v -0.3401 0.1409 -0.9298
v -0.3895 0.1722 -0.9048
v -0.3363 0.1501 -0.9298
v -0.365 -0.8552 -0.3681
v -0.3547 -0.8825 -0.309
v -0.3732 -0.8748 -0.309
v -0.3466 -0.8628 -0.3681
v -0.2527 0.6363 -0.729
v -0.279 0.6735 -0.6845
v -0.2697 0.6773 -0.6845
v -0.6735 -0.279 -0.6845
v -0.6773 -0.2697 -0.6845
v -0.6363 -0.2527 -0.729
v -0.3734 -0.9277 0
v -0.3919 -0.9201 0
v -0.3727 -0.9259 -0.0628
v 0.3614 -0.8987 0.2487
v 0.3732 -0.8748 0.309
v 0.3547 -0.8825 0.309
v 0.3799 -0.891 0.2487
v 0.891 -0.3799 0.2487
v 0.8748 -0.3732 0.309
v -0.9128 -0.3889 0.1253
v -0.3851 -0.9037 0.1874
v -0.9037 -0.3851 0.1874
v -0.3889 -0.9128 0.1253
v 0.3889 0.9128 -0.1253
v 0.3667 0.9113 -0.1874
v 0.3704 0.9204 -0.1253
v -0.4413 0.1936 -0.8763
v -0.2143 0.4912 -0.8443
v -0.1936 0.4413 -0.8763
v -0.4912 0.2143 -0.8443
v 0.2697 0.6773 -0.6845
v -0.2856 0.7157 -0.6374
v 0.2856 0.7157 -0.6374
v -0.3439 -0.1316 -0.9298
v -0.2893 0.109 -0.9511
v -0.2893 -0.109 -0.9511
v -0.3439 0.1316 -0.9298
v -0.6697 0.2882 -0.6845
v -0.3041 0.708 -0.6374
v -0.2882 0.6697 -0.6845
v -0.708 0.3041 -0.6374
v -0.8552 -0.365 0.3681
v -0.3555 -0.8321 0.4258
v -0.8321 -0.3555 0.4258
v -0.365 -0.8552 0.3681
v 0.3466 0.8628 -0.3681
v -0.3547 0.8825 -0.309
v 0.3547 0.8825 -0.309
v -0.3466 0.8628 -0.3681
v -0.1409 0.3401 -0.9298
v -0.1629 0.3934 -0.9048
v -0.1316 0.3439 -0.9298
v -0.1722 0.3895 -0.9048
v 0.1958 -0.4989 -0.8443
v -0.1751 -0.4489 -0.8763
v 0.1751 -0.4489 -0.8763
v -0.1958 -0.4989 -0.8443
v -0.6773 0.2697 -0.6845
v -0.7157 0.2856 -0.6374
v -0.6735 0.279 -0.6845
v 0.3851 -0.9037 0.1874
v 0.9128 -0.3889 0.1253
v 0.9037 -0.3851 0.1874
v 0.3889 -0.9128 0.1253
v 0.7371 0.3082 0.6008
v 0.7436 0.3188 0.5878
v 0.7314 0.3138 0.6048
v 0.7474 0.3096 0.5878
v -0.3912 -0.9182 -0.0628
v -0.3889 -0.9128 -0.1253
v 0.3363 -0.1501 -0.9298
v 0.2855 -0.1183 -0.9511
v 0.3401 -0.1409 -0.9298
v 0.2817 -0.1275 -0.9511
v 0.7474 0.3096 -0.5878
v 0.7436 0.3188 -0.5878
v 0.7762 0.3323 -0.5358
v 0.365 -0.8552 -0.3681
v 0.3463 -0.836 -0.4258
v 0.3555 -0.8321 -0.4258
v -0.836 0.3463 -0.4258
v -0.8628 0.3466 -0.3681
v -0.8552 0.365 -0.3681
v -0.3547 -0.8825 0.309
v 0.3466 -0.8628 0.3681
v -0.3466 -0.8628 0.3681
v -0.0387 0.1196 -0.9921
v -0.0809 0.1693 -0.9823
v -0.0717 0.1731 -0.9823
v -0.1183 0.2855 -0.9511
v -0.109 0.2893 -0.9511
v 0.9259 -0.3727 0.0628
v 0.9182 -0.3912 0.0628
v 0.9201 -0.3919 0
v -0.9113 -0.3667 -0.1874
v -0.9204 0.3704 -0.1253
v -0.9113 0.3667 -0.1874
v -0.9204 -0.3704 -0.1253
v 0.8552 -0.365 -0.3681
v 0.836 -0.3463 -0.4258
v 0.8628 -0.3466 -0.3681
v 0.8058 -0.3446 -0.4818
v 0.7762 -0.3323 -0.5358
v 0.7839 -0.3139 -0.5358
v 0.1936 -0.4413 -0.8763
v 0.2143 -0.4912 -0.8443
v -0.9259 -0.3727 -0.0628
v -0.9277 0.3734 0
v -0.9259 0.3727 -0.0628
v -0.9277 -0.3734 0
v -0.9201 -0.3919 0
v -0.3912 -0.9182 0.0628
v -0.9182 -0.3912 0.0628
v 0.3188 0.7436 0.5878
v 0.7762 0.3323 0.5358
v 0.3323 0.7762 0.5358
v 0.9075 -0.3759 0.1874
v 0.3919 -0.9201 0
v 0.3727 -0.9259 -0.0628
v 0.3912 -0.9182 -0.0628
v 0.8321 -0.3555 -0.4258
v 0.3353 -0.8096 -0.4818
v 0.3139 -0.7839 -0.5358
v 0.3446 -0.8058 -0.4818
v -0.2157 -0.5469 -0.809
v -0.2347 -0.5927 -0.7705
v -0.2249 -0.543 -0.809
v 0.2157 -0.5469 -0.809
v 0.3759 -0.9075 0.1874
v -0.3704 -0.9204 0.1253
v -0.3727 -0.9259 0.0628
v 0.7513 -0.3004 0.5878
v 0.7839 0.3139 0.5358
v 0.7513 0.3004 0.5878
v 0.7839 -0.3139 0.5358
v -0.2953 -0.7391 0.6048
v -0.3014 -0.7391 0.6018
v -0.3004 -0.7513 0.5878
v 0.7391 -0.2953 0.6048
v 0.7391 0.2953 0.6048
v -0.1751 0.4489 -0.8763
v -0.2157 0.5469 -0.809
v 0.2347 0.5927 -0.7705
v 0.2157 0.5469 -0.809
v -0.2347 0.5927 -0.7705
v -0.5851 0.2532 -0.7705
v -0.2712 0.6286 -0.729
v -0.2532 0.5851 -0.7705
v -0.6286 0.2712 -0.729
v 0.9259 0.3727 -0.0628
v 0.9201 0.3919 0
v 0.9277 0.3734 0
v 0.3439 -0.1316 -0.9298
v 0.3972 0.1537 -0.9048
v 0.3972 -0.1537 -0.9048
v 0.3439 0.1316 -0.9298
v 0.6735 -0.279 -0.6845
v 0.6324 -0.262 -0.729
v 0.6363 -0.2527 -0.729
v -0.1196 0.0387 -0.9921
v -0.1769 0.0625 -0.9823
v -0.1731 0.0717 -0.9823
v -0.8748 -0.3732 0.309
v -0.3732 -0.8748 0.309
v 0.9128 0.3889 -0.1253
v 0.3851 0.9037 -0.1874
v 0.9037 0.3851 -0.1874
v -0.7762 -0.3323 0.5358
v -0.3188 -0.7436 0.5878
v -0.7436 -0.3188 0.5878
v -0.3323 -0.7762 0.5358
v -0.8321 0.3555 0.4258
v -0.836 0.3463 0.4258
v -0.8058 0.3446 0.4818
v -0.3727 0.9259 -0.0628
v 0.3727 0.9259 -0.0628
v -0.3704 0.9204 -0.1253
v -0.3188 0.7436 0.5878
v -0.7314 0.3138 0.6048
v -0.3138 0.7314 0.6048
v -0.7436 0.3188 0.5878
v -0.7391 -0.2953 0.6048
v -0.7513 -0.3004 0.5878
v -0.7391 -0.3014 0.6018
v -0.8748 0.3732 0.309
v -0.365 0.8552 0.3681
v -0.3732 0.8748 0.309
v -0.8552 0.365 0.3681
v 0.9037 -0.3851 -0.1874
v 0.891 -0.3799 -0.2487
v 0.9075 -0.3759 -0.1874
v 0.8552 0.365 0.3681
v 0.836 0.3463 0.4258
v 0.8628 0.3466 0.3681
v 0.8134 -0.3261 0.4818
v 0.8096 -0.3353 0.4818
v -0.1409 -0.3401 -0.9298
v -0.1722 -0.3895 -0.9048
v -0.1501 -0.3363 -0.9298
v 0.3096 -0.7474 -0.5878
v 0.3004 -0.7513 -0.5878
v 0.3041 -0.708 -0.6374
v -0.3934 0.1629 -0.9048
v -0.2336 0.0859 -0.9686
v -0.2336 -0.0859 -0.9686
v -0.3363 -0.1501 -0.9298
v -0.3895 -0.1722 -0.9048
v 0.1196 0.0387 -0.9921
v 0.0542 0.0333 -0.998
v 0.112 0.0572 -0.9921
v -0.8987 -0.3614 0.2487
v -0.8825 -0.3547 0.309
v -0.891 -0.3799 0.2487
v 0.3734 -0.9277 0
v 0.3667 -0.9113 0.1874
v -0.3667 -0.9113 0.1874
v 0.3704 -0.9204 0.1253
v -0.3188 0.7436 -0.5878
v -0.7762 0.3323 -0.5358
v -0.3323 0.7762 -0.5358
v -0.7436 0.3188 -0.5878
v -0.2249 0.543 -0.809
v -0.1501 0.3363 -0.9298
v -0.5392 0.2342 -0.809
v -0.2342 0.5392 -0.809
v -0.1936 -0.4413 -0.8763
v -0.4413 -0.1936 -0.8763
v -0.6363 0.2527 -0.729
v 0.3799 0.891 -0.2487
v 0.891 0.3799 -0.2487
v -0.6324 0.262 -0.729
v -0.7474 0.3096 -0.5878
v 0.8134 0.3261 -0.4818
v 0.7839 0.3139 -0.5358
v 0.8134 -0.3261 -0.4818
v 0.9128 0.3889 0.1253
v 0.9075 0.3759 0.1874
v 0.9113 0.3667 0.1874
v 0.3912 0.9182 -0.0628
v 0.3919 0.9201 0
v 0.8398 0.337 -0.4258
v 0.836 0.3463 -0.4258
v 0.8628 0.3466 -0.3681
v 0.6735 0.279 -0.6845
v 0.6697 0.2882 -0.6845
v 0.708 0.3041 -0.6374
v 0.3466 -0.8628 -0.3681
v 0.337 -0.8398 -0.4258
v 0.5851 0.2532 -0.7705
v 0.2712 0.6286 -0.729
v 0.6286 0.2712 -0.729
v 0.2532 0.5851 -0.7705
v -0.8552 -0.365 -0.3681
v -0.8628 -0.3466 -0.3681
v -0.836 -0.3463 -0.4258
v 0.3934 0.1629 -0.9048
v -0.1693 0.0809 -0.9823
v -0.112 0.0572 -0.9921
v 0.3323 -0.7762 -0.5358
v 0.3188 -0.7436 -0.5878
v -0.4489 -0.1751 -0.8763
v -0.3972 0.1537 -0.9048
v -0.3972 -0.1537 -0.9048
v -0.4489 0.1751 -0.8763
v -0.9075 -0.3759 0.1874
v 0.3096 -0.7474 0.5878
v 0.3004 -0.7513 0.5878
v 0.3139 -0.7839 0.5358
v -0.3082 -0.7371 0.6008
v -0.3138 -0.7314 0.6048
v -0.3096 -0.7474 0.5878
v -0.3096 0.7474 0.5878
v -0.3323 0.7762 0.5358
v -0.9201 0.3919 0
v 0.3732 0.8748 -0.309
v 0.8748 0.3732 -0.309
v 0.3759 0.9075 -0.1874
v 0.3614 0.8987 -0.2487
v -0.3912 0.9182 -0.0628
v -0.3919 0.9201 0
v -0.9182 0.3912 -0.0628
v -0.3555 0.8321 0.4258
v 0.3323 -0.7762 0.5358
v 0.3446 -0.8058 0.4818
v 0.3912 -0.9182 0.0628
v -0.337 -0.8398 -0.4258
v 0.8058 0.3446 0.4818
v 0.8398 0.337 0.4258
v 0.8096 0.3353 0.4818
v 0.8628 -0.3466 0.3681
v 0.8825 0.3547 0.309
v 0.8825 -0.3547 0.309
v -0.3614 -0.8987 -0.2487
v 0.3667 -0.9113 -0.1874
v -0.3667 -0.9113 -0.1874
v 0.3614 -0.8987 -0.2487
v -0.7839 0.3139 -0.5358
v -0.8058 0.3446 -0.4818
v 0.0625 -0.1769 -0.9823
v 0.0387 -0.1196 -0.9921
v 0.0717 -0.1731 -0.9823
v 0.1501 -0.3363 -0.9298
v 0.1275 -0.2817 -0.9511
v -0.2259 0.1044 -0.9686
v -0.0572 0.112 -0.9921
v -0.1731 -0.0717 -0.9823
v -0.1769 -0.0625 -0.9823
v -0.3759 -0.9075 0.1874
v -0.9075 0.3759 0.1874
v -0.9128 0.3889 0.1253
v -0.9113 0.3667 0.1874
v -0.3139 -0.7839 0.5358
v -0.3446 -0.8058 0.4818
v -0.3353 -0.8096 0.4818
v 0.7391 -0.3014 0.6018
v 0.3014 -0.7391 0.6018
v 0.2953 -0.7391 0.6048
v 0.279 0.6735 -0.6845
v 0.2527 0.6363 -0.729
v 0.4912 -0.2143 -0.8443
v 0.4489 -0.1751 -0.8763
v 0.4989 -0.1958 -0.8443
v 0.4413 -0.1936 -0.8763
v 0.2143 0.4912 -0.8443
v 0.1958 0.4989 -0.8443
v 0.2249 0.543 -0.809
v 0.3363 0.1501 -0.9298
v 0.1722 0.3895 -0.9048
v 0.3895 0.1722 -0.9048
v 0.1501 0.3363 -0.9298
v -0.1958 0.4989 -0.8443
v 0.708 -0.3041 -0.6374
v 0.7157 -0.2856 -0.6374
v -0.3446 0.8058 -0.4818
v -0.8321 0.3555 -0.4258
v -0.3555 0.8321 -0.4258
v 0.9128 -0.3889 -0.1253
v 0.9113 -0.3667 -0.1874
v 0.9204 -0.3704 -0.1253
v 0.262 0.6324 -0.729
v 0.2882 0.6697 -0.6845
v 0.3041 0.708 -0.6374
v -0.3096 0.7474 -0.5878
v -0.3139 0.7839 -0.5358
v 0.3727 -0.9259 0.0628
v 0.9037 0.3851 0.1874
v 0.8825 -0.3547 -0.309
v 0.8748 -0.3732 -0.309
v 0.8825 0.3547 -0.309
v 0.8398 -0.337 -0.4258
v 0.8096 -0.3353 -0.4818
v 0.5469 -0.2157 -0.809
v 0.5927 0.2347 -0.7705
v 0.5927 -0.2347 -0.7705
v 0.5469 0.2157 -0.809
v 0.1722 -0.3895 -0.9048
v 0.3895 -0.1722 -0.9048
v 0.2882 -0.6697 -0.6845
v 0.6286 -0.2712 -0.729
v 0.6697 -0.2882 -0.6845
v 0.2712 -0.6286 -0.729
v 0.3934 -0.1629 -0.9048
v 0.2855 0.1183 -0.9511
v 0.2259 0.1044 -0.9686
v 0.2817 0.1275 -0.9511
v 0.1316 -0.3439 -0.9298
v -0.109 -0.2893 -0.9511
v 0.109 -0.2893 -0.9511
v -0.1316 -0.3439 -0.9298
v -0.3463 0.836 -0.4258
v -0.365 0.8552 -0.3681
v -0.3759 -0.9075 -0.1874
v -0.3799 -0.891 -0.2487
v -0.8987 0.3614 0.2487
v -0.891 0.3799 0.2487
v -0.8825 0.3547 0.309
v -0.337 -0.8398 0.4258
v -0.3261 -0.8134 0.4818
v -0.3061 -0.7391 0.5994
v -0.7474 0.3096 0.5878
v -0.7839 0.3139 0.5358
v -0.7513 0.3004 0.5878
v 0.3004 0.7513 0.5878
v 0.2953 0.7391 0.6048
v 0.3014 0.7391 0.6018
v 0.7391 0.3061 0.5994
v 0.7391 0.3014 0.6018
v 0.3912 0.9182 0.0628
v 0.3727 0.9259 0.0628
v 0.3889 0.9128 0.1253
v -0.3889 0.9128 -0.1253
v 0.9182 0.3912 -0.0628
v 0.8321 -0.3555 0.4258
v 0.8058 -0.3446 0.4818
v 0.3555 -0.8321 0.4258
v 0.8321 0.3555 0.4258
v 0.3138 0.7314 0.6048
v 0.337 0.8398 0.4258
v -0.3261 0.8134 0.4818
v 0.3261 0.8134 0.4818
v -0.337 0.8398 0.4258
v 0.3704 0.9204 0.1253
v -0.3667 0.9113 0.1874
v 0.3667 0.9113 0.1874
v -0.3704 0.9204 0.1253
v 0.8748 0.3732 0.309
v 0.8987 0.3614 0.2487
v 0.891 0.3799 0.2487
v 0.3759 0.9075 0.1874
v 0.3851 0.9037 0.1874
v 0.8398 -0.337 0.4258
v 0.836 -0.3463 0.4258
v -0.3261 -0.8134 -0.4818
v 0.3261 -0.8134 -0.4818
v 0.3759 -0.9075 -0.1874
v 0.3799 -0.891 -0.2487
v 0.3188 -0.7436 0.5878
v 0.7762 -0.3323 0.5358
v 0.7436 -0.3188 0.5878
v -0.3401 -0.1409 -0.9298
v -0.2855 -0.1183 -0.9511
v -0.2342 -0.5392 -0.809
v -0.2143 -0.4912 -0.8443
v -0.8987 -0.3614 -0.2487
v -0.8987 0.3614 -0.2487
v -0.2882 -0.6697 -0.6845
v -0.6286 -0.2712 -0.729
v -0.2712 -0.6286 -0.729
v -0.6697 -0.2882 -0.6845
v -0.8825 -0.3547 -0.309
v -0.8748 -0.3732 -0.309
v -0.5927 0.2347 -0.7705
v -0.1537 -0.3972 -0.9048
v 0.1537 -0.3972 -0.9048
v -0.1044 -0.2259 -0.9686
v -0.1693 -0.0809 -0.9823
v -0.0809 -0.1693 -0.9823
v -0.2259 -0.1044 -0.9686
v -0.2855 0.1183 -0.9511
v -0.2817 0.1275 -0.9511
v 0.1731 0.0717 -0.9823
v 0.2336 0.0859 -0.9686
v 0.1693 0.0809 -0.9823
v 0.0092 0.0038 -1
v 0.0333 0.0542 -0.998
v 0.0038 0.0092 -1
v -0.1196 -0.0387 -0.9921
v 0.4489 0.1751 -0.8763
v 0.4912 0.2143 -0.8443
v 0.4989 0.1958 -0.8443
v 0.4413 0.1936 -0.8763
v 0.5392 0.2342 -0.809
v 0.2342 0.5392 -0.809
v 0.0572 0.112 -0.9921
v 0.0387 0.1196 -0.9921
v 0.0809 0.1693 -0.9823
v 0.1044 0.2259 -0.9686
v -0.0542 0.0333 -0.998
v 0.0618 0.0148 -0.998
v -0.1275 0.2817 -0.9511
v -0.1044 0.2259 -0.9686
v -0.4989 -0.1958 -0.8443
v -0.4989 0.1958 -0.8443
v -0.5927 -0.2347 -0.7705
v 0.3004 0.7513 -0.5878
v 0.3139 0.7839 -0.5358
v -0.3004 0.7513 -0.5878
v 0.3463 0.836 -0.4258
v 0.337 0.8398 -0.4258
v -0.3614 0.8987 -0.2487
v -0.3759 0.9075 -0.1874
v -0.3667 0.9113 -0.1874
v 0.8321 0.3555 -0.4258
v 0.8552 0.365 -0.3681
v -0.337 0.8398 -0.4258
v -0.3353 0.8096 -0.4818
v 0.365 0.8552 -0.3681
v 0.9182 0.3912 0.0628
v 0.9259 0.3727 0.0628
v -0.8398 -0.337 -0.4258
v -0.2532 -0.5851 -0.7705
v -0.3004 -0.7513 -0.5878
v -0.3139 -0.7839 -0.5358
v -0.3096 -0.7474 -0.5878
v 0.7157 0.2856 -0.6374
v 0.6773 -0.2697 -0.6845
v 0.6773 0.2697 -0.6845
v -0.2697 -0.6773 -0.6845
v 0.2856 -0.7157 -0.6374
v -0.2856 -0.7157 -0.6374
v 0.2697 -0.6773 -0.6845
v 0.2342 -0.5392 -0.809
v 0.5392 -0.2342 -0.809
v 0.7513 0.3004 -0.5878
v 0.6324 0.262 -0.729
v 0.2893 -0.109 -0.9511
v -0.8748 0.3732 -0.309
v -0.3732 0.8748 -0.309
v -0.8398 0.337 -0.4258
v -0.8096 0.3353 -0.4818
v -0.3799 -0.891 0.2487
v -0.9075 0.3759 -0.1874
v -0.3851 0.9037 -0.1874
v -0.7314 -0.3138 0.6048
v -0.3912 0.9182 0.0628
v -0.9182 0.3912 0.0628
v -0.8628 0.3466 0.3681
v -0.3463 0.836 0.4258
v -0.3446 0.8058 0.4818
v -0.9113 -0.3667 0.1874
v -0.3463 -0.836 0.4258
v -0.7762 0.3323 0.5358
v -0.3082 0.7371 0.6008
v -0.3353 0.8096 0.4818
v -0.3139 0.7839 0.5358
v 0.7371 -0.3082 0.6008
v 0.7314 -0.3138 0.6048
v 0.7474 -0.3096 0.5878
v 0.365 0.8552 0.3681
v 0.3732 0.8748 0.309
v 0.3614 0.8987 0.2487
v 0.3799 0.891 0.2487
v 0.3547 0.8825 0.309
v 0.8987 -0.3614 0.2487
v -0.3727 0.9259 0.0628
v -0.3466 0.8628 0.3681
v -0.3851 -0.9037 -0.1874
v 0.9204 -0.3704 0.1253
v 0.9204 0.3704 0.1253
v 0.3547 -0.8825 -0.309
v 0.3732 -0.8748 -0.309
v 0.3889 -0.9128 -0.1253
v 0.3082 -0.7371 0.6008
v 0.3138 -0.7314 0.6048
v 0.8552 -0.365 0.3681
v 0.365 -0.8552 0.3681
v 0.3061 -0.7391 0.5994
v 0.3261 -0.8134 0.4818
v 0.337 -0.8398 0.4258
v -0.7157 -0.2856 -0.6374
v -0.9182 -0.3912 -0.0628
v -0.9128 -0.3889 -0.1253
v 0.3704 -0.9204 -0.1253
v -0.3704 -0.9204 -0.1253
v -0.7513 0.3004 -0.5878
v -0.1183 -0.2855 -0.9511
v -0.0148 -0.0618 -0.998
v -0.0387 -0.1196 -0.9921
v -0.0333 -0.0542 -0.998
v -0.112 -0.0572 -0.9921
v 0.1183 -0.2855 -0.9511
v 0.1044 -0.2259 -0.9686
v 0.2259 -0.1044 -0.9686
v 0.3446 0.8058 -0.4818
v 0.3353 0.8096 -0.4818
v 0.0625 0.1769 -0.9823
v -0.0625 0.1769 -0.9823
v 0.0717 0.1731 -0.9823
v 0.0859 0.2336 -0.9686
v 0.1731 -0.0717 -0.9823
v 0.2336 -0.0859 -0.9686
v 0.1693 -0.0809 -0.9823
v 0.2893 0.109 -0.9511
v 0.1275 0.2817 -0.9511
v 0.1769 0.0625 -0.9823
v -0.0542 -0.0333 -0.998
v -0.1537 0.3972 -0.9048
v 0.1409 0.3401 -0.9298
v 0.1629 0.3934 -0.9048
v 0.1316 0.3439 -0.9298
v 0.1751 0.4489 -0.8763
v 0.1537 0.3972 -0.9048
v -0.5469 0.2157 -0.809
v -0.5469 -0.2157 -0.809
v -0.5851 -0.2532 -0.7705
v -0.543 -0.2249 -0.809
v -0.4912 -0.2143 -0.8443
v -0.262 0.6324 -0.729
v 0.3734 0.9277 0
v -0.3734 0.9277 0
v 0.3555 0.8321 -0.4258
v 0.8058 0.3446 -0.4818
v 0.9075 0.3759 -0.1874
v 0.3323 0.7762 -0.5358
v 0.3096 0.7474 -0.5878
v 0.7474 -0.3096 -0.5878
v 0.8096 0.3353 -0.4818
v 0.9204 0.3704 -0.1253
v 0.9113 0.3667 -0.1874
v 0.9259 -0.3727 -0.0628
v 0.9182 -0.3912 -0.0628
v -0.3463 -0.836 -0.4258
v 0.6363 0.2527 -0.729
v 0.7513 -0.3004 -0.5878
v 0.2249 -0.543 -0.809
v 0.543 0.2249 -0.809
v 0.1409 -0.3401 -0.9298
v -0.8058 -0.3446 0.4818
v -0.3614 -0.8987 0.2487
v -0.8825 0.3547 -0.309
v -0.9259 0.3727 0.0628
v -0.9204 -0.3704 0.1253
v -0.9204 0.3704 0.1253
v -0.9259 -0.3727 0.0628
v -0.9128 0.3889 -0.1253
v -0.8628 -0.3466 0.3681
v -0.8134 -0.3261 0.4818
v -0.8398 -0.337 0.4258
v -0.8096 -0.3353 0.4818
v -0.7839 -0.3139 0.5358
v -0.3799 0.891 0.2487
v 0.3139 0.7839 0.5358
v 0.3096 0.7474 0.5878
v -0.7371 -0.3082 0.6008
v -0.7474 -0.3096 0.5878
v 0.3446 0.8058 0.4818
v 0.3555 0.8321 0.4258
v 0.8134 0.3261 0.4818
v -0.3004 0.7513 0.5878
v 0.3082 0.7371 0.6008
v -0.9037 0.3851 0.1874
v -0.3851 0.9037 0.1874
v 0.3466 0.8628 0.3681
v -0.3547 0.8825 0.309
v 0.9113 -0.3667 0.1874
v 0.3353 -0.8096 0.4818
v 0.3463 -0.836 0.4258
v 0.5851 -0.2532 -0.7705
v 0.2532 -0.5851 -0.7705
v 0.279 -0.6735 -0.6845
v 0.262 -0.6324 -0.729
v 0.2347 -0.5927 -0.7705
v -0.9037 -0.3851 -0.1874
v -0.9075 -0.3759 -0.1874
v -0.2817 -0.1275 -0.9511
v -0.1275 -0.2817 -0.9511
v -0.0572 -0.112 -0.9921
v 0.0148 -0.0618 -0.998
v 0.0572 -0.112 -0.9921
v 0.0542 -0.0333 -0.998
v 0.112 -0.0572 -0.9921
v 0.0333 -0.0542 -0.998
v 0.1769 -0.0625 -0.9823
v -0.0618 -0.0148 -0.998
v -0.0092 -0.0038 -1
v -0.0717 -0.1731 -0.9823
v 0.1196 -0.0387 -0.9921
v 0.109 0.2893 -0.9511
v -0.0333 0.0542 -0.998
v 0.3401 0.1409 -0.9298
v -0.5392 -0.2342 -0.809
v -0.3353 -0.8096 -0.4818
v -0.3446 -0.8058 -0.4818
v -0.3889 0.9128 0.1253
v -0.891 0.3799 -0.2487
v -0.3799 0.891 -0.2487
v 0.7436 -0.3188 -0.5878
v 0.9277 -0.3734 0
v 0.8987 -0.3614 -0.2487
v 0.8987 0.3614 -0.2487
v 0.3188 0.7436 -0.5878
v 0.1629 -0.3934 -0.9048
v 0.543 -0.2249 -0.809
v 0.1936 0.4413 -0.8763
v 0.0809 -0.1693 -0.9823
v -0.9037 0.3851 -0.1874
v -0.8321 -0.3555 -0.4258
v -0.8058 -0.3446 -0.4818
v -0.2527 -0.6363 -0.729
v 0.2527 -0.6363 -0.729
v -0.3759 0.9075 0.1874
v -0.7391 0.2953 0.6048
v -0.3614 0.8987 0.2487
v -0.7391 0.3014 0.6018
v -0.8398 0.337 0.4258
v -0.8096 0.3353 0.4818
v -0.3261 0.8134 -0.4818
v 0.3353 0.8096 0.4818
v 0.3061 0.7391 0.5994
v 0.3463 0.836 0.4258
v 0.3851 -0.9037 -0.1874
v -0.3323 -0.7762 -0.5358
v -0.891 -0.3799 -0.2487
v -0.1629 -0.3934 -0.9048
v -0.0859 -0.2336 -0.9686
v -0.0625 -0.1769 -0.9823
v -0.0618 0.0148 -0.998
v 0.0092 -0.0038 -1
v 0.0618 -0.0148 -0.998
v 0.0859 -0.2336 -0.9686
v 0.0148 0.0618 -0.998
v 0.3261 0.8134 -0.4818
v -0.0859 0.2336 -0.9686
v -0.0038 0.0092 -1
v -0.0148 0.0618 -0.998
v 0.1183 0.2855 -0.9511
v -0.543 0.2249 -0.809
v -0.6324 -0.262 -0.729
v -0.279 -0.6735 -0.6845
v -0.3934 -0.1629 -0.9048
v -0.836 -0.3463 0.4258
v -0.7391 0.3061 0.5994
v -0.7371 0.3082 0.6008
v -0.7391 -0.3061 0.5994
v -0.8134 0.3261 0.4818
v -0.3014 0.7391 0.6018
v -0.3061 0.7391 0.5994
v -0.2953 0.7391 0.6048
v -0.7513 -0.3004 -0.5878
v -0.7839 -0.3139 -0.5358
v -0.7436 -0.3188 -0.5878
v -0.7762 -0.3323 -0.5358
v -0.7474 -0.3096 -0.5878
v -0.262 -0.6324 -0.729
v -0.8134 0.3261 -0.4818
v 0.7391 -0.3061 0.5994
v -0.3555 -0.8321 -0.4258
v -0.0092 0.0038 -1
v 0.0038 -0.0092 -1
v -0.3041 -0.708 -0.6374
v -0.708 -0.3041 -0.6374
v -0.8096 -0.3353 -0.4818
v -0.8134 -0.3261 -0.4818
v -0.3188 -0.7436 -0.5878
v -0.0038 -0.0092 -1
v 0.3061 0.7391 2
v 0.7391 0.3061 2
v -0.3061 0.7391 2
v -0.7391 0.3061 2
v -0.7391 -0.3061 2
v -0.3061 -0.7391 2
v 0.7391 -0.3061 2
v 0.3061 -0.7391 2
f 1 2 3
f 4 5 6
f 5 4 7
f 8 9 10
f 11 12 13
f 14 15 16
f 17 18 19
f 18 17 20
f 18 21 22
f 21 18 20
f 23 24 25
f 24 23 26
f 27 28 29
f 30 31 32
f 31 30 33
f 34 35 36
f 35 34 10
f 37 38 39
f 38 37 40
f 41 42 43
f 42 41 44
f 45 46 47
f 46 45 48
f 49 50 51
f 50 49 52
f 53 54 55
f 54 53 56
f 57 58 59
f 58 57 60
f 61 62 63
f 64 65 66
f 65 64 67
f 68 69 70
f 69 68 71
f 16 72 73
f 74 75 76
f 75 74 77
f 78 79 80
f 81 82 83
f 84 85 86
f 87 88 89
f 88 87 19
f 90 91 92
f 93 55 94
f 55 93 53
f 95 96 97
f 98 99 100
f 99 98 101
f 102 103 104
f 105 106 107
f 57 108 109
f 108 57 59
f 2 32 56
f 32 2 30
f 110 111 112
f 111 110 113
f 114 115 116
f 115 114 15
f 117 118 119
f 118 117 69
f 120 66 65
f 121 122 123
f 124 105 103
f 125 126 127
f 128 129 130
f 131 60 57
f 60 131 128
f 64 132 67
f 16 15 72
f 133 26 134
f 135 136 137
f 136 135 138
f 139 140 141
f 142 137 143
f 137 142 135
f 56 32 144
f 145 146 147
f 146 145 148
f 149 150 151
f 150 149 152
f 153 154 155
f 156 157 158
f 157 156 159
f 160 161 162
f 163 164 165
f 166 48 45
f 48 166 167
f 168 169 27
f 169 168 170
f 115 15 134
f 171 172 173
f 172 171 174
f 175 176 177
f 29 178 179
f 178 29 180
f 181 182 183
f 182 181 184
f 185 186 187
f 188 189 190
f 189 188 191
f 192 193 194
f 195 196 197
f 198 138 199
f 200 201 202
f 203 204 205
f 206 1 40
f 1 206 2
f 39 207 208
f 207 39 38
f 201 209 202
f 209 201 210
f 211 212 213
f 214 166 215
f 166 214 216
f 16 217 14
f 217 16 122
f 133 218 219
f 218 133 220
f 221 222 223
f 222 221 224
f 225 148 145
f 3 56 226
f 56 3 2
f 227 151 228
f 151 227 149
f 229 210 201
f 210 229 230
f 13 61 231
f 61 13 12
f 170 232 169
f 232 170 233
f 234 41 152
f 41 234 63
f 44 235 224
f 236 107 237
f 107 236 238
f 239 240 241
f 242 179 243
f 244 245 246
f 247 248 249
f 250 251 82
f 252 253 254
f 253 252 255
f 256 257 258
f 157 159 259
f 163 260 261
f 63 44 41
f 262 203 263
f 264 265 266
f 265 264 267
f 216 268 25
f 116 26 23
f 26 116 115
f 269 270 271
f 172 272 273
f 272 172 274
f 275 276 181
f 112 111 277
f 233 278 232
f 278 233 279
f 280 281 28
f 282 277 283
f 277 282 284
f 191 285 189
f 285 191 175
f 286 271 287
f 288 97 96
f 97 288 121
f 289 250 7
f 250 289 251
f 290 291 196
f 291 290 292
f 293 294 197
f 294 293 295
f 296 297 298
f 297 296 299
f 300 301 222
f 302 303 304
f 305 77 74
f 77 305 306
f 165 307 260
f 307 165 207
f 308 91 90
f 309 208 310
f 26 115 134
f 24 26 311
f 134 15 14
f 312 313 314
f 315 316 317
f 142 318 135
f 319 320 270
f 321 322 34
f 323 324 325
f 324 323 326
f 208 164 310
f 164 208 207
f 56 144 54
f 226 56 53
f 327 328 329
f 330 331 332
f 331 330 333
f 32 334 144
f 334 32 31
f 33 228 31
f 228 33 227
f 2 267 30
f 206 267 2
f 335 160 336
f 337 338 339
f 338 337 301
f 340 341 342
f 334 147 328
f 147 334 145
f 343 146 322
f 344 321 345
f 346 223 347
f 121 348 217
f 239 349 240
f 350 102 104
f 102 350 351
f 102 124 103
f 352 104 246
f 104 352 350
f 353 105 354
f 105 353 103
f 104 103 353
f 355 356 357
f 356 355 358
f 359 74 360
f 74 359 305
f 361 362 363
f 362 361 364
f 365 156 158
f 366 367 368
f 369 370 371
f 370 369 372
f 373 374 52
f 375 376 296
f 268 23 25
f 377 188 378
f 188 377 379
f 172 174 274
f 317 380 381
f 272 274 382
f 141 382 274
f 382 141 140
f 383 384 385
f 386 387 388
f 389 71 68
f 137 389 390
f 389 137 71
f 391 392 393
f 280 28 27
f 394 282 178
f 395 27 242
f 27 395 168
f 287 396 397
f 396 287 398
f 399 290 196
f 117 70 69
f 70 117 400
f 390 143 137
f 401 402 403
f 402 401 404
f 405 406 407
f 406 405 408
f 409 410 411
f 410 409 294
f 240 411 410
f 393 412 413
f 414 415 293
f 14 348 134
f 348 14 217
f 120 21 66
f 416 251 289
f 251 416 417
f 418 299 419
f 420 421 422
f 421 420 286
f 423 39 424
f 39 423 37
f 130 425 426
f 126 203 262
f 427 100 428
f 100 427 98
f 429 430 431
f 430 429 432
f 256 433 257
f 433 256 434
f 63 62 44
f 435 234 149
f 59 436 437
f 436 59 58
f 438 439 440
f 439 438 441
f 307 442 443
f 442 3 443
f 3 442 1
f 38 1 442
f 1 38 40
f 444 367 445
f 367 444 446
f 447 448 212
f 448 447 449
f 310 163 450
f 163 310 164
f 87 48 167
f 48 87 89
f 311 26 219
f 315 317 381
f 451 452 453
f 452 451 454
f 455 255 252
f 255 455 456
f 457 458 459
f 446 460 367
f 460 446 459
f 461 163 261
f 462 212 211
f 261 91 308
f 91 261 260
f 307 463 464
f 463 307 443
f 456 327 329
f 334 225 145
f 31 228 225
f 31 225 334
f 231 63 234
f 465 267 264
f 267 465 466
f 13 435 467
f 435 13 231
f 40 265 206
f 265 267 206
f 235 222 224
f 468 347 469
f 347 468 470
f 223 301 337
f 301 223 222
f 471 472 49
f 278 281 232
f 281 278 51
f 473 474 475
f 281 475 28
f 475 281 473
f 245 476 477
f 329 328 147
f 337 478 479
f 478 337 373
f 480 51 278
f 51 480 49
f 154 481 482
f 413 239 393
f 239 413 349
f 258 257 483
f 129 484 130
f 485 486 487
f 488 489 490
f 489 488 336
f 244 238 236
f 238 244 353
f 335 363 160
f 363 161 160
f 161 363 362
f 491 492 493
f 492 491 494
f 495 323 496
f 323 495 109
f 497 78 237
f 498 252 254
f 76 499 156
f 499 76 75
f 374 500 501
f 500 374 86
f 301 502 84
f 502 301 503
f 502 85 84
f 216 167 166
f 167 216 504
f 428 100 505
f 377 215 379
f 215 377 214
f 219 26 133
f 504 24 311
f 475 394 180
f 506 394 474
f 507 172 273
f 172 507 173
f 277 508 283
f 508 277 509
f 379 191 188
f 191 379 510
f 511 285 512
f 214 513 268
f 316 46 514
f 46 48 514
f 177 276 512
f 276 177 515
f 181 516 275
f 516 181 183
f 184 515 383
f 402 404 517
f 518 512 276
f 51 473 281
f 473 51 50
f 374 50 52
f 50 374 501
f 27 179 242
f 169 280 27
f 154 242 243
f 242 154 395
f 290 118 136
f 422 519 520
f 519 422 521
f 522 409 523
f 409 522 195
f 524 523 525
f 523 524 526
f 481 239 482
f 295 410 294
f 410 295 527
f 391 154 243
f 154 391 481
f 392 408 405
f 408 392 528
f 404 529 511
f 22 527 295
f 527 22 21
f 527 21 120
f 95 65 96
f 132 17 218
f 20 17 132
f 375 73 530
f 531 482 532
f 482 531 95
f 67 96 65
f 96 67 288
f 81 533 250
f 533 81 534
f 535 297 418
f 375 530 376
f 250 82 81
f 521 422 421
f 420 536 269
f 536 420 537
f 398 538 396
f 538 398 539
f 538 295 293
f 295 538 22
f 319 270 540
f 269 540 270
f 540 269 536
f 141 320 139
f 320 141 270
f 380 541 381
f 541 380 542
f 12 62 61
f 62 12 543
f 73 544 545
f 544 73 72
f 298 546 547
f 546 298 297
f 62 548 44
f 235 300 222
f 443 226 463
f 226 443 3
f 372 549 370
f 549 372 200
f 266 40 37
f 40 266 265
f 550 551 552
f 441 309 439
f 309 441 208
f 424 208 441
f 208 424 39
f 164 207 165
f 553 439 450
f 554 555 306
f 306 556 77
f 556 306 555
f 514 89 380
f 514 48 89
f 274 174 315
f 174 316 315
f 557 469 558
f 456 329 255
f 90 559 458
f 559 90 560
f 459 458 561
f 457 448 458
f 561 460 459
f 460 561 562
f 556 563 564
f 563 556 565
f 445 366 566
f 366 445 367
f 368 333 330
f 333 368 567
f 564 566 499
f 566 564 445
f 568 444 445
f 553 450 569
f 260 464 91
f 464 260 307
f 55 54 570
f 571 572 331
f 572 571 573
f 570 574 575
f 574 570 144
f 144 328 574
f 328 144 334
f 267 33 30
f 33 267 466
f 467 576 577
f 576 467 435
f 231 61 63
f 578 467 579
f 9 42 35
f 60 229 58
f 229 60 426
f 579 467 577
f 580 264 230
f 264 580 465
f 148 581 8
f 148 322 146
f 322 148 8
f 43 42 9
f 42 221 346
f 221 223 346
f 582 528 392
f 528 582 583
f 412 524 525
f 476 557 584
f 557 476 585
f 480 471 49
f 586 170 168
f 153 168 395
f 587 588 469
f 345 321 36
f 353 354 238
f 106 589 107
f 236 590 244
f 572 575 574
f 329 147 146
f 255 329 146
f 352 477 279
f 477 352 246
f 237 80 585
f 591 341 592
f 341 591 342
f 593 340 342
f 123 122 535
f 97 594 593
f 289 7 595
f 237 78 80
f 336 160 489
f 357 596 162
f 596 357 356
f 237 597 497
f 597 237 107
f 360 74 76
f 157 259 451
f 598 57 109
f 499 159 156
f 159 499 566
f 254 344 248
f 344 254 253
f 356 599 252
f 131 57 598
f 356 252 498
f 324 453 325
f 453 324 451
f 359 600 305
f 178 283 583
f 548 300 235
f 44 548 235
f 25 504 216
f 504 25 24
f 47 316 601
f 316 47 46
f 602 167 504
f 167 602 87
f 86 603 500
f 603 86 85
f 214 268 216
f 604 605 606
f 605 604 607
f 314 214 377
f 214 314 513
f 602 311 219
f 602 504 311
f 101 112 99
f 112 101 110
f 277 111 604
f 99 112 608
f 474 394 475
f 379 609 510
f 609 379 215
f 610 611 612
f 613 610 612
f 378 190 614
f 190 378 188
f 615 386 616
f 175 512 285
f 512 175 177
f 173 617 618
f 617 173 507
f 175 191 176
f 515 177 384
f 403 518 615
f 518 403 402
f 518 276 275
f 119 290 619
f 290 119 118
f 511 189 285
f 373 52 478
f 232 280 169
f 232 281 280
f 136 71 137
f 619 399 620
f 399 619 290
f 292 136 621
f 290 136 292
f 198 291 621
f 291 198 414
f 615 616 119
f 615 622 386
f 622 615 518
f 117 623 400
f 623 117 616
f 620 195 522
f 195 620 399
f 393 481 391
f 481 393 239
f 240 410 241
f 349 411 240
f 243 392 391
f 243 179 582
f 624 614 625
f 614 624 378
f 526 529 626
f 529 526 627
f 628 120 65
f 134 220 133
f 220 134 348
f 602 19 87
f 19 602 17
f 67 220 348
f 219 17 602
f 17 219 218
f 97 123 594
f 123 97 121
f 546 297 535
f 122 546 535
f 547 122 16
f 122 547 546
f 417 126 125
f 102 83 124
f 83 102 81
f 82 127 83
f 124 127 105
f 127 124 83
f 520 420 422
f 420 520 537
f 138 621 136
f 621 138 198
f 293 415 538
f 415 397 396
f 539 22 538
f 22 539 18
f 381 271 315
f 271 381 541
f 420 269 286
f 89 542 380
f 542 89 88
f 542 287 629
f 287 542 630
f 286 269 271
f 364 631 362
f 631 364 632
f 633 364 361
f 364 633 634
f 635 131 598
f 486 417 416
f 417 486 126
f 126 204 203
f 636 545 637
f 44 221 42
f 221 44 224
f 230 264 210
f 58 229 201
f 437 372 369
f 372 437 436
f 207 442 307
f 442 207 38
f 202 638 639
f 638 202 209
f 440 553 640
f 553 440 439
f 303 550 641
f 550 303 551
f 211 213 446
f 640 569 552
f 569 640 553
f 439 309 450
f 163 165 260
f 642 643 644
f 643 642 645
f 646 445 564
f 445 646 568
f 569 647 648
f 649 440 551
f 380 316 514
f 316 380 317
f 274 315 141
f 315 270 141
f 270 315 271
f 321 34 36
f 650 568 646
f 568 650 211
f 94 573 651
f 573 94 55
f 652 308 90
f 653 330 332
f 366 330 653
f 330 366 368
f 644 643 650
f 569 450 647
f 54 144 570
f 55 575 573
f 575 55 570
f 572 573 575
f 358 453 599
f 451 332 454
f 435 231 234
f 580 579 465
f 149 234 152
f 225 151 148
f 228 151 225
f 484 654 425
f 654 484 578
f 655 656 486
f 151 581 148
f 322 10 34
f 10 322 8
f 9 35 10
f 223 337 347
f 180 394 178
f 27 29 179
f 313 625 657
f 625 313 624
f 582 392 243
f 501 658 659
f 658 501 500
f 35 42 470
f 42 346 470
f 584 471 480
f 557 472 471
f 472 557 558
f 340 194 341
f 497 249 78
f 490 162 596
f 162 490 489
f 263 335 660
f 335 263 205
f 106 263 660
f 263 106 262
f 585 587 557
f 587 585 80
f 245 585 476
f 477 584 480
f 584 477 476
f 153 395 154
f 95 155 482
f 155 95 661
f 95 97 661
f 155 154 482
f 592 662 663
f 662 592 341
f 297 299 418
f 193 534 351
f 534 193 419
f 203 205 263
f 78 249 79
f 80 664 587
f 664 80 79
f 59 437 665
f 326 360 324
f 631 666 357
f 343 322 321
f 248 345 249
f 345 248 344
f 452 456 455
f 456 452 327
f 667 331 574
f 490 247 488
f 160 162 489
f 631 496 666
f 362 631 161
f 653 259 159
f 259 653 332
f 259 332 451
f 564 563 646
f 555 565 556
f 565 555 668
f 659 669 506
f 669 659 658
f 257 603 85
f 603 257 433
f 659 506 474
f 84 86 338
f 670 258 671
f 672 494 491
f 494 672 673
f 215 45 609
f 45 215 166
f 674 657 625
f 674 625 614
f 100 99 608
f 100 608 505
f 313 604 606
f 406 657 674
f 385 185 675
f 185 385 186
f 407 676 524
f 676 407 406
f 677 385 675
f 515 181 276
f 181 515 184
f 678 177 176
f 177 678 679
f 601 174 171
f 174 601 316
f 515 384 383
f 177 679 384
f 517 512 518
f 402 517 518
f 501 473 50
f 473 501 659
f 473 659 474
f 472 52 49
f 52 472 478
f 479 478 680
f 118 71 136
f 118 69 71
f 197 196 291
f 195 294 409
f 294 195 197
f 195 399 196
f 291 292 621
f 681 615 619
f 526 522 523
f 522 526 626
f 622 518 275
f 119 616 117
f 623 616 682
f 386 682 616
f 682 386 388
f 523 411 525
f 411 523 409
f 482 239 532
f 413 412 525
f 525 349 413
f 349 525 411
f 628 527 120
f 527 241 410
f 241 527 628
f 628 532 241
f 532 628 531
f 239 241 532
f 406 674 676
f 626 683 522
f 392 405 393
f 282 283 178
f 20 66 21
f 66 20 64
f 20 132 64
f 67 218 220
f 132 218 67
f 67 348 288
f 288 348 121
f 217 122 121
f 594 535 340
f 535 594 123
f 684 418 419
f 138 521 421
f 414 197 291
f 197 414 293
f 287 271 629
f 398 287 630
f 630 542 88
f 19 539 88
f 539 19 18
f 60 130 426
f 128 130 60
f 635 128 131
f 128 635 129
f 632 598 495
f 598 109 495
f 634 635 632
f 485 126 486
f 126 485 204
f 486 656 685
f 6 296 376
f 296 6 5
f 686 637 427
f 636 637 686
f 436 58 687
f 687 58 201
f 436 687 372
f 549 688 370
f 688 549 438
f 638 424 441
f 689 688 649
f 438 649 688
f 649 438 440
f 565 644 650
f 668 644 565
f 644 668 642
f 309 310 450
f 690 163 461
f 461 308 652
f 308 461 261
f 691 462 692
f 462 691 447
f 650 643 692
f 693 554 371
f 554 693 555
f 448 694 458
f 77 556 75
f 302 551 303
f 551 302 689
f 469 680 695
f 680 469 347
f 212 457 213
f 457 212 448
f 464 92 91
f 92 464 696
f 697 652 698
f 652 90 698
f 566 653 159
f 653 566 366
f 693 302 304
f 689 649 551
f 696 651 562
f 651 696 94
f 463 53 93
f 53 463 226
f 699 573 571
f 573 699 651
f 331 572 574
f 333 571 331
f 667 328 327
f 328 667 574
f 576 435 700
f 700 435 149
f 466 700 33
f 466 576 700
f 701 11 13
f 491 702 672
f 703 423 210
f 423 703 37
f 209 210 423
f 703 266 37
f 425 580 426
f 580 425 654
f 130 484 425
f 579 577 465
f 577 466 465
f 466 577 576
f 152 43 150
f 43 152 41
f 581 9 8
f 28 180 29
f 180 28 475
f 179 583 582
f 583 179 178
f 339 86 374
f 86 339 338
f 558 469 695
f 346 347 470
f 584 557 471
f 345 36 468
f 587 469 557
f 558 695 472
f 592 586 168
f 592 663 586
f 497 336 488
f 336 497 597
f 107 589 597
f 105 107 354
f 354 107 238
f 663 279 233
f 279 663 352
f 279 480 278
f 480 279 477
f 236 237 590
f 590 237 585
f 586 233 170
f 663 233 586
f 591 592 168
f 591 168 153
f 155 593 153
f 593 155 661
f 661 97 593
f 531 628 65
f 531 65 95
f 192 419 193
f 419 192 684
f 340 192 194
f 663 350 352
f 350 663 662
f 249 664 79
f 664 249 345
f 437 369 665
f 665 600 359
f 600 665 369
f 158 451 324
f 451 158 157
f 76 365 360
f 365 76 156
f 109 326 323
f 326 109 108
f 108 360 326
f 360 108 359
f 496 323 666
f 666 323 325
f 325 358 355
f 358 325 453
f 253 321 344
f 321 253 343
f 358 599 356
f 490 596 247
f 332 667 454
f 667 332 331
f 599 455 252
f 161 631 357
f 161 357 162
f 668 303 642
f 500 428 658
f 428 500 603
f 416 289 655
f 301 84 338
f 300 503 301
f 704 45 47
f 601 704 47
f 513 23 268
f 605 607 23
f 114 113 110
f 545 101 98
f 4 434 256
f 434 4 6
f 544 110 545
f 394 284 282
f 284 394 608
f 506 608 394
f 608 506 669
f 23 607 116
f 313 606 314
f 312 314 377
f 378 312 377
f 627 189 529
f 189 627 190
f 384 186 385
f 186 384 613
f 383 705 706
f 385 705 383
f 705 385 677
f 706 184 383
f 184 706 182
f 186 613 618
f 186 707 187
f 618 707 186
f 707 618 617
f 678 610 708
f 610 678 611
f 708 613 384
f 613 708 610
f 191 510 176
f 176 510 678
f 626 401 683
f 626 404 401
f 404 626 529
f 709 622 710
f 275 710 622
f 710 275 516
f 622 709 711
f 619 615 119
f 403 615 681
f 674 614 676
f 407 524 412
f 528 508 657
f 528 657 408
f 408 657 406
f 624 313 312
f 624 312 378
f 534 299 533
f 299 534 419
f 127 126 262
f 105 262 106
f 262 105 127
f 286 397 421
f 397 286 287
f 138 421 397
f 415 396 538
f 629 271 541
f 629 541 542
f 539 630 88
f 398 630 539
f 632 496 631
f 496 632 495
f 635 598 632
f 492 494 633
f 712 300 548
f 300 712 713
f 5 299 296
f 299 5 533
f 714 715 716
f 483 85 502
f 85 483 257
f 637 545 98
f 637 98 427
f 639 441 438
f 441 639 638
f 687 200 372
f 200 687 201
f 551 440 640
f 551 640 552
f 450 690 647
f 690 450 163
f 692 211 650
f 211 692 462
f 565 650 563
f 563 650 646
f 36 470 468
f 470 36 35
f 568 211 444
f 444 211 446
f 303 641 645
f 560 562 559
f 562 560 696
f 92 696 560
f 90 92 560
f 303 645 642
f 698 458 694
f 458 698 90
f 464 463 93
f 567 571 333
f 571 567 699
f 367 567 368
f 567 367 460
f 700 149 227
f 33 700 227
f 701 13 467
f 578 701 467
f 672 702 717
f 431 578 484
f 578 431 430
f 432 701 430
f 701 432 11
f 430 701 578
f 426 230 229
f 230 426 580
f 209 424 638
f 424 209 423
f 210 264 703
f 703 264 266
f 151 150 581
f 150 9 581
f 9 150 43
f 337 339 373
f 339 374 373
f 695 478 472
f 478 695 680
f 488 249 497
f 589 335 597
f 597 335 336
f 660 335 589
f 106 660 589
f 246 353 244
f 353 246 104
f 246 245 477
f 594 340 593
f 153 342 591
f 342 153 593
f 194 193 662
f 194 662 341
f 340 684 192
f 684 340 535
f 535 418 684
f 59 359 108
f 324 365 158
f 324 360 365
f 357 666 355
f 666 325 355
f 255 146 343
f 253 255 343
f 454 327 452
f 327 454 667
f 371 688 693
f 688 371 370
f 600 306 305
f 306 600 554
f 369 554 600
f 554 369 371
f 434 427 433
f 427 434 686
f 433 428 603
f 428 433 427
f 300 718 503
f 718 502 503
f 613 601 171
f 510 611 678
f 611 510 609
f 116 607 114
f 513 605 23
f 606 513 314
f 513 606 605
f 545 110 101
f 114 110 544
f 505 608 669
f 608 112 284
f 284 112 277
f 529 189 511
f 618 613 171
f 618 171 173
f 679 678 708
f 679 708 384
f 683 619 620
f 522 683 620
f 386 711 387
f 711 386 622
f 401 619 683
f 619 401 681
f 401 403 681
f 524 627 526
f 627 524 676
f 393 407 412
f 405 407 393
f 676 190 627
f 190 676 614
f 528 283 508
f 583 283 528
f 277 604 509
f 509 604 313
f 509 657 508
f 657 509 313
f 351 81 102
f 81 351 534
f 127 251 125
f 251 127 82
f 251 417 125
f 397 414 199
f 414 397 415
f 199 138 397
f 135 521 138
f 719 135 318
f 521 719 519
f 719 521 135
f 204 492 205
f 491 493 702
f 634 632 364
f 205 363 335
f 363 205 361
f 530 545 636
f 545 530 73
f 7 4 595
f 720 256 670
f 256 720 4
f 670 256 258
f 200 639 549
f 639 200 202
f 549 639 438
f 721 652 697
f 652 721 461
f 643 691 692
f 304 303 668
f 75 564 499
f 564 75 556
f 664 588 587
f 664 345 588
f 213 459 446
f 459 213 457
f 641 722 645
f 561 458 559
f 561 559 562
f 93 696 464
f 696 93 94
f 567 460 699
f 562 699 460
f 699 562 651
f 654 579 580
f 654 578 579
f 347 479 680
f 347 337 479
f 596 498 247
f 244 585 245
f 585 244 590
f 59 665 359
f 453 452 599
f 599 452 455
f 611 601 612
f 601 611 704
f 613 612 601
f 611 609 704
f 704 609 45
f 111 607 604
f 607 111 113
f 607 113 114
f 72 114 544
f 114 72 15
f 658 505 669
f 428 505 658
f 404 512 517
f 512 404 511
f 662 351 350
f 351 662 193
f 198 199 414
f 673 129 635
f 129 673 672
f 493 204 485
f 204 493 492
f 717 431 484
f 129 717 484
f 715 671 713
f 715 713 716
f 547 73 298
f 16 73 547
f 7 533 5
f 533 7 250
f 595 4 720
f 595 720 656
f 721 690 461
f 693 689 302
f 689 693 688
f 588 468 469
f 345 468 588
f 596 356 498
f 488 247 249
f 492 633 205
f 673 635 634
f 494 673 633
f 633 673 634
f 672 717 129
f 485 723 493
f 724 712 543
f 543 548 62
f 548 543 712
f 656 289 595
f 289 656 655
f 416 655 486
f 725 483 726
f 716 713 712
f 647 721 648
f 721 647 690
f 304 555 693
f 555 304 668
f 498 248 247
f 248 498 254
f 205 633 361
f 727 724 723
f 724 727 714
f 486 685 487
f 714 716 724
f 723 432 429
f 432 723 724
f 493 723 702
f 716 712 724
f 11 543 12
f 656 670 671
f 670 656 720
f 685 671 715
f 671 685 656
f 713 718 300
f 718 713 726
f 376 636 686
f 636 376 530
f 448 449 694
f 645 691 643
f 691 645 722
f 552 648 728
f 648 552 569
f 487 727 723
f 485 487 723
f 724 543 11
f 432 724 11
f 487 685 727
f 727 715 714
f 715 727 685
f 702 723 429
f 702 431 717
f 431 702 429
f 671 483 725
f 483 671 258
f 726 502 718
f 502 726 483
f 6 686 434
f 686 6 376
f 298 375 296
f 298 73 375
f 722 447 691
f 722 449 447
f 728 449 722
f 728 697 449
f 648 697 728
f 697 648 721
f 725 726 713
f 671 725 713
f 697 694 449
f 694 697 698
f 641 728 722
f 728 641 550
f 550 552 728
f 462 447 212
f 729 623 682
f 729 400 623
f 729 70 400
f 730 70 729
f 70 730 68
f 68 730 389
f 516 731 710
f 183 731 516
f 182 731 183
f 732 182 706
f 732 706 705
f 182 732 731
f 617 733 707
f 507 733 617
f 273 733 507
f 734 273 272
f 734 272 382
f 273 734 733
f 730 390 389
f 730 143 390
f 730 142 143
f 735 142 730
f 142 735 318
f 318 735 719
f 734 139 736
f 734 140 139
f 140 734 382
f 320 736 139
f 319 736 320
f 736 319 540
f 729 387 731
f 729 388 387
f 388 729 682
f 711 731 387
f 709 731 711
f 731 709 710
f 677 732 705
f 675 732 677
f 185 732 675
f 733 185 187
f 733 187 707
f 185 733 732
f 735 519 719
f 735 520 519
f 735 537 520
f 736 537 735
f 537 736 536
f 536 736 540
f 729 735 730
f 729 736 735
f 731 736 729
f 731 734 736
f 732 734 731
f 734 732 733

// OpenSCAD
$fn=100;
n = 8;
a = 360/n;
module prisma(n, r, h)
{
    a = 360/n;
    points = [for (t = [1:n])[r*cos(-a/2 + t*a), r*sin(-a/2 + t*a)]];
    linear_extrude(height=h)        
    polygon(points);        
}

hull() 
{
    for (i=[1:n])
    {
        rotate([-a/2 + i*a, 90, 0])
        linear_extrude(height=0.01) 
        circle(r = 1);
    }    
}

prisma(n, 0.8, 2);
